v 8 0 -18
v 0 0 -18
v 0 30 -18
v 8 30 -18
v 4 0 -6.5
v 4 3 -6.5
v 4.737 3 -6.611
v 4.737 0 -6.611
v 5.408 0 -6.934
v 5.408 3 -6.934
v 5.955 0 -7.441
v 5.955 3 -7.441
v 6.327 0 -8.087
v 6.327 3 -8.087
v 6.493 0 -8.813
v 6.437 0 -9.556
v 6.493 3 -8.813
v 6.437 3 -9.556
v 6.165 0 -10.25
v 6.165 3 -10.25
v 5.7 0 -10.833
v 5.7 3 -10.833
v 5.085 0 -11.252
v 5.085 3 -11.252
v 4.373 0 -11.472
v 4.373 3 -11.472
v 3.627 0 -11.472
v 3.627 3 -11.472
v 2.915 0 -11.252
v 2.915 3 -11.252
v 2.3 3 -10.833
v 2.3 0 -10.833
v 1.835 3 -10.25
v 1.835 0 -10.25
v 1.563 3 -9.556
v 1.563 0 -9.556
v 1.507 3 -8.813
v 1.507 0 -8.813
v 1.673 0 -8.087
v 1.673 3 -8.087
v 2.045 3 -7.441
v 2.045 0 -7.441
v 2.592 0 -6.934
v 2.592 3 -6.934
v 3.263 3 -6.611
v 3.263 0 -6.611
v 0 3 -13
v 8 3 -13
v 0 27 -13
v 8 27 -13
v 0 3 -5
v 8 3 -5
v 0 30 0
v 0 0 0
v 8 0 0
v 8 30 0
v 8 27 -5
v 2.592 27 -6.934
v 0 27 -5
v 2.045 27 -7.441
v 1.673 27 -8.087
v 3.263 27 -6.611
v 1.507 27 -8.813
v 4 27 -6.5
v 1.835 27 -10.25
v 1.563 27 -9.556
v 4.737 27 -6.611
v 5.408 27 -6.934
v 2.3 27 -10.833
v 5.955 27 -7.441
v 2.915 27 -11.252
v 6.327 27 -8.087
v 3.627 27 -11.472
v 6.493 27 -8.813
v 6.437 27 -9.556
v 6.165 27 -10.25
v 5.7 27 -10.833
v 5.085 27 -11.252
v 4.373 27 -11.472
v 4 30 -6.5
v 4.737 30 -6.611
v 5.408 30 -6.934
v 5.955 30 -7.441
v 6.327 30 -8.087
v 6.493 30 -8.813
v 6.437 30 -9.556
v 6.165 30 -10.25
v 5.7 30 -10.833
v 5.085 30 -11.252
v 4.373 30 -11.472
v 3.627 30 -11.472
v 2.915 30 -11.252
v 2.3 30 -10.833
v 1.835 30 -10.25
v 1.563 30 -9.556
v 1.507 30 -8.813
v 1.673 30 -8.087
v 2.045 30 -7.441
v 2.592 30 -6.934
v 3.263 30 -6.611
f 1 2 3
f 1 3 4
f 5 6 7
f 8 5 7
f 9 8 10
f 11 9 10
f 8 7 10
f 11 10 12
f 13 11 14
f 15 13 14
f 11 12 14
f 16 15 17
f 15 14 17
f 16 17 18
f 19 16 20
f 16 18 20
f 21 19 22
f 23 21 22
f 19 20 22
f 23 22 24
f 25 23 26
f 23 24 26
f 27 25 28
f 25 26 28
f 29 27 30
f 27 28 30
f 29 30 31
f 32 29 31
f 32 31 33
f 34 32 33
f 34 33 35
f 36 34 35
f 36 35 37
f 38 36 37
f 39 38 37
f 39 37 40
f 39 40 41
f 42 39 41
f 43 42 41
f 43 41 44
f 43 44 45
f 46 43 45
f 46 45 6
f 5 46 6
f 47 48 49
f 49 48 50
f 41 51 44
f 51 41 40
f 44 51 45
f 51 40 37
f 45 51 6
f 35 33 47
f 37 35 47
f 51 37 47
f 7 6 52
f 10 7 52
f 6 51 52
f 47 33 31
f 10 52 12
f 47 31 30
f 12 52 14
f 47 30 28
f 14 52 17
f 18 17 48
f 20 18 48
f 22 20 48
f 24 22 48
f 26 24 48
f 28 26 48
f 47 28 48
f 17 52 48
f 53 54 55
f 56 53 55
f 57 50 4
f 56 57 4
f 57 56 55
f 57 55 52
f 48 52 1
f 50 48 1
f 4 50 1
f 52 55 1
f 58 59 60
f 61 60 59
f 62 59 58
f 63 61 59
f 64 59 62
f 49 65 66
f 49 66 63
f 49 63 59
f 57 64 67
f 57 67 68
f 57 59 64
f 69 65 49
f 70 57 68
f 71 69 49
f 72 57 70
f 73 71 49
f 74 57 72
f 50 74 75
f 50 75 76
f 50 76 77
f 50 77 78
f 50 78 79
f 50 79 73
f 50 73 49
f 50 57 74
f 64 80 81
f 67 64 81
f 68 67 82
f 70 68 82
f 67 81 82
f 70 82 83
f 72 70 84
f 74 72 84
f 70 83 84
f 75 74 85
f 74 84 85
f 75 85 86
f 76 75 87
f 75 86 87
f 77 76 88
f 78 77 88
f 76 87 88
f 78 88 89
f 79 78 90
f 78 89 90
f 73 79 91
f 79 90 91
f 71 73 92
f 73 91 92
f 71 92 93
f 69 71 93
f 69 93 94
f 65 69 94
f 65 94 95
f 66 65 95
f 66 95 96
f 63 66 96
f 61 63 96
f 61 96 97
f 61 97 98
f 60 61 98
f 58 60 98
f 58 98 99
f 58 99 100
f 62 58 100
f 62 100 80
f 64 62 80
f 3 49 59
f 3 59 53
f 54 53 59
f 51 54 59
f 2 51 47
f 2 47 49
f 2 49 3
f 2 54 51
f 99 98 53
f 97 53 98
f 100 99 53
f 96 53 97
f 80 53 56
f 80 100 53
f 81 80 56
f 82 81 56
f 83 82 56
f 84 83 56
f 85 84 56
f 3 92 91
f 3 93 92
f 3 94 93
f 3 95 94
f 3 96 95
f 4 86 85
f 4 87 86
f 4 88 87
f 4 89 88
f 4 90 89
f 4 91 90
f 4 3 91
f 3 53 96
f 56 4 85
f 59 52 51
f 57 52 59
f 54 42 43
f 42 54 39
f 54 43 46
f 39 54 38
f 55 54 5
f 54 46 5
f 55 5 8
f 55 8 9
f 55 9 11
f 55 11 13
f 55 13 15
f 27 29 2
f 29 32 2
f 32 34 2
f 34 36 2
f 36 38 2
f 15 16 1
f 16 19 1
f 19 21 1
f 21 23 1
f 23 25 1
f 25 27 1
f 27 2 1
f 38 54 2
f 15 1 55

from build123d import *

# Parameters (mm, degrees)
SKETCH2_W           = 8
SKETCH2_H           = 18
BOSS_EXTRUDE1_DEPTH = 30
SKETCH3_R           = 2.5
CUT_EXTRUDE1_DEPTH  = 30
SKETCH5_W           = 8
SKETCH5_H           = 24
CUT_EXTRUDE2_DEPTH  = 30


with BuildPart() as part:
    # Sketch2 → Boss-Extrude1 (new body)
    with BuildSketch(Plane(origin=(0, 0, 0), x_dir=(1, 0, 0), z_dir=(0, 1, 0))):
        with Locations((4, 9)):
            Rectangle(SKETCH2_W, SKETCH2_H)
    extrude(amount=BOSS_EXTRUDE1_DEPTH)

    # Sketch3 → Cut-Extrude1 (cut)
    with BuildSketch(Plane(origin=(0, 30, 0), x_dir=(1, 0, 0), z_dir=(0, 1, 0))):
        with Locations(Location((4, 9, 0), (0, 0, 270))):
            Circle(SKETCH3_R)
    extrude(amount=-CUT_EXTRUDE1_DEPTH, mode=Mode.SUBTRACT)

    # Sketch5 → Cut-Extrude2 (cut)
    with BuildSketch(Plane(origin=(8, 0, 0), x_dir=(0, 0, -1), z_dir=(1, 0, 0))):
        with Locations((9, 15)):
            Rectangle(SKETCH5_W, SKETCH5_H)
    extrude(amount=-CUT_EXTRUDE2_DEPTH, mode=Mode.SUBTRACT)


solid = part.part
